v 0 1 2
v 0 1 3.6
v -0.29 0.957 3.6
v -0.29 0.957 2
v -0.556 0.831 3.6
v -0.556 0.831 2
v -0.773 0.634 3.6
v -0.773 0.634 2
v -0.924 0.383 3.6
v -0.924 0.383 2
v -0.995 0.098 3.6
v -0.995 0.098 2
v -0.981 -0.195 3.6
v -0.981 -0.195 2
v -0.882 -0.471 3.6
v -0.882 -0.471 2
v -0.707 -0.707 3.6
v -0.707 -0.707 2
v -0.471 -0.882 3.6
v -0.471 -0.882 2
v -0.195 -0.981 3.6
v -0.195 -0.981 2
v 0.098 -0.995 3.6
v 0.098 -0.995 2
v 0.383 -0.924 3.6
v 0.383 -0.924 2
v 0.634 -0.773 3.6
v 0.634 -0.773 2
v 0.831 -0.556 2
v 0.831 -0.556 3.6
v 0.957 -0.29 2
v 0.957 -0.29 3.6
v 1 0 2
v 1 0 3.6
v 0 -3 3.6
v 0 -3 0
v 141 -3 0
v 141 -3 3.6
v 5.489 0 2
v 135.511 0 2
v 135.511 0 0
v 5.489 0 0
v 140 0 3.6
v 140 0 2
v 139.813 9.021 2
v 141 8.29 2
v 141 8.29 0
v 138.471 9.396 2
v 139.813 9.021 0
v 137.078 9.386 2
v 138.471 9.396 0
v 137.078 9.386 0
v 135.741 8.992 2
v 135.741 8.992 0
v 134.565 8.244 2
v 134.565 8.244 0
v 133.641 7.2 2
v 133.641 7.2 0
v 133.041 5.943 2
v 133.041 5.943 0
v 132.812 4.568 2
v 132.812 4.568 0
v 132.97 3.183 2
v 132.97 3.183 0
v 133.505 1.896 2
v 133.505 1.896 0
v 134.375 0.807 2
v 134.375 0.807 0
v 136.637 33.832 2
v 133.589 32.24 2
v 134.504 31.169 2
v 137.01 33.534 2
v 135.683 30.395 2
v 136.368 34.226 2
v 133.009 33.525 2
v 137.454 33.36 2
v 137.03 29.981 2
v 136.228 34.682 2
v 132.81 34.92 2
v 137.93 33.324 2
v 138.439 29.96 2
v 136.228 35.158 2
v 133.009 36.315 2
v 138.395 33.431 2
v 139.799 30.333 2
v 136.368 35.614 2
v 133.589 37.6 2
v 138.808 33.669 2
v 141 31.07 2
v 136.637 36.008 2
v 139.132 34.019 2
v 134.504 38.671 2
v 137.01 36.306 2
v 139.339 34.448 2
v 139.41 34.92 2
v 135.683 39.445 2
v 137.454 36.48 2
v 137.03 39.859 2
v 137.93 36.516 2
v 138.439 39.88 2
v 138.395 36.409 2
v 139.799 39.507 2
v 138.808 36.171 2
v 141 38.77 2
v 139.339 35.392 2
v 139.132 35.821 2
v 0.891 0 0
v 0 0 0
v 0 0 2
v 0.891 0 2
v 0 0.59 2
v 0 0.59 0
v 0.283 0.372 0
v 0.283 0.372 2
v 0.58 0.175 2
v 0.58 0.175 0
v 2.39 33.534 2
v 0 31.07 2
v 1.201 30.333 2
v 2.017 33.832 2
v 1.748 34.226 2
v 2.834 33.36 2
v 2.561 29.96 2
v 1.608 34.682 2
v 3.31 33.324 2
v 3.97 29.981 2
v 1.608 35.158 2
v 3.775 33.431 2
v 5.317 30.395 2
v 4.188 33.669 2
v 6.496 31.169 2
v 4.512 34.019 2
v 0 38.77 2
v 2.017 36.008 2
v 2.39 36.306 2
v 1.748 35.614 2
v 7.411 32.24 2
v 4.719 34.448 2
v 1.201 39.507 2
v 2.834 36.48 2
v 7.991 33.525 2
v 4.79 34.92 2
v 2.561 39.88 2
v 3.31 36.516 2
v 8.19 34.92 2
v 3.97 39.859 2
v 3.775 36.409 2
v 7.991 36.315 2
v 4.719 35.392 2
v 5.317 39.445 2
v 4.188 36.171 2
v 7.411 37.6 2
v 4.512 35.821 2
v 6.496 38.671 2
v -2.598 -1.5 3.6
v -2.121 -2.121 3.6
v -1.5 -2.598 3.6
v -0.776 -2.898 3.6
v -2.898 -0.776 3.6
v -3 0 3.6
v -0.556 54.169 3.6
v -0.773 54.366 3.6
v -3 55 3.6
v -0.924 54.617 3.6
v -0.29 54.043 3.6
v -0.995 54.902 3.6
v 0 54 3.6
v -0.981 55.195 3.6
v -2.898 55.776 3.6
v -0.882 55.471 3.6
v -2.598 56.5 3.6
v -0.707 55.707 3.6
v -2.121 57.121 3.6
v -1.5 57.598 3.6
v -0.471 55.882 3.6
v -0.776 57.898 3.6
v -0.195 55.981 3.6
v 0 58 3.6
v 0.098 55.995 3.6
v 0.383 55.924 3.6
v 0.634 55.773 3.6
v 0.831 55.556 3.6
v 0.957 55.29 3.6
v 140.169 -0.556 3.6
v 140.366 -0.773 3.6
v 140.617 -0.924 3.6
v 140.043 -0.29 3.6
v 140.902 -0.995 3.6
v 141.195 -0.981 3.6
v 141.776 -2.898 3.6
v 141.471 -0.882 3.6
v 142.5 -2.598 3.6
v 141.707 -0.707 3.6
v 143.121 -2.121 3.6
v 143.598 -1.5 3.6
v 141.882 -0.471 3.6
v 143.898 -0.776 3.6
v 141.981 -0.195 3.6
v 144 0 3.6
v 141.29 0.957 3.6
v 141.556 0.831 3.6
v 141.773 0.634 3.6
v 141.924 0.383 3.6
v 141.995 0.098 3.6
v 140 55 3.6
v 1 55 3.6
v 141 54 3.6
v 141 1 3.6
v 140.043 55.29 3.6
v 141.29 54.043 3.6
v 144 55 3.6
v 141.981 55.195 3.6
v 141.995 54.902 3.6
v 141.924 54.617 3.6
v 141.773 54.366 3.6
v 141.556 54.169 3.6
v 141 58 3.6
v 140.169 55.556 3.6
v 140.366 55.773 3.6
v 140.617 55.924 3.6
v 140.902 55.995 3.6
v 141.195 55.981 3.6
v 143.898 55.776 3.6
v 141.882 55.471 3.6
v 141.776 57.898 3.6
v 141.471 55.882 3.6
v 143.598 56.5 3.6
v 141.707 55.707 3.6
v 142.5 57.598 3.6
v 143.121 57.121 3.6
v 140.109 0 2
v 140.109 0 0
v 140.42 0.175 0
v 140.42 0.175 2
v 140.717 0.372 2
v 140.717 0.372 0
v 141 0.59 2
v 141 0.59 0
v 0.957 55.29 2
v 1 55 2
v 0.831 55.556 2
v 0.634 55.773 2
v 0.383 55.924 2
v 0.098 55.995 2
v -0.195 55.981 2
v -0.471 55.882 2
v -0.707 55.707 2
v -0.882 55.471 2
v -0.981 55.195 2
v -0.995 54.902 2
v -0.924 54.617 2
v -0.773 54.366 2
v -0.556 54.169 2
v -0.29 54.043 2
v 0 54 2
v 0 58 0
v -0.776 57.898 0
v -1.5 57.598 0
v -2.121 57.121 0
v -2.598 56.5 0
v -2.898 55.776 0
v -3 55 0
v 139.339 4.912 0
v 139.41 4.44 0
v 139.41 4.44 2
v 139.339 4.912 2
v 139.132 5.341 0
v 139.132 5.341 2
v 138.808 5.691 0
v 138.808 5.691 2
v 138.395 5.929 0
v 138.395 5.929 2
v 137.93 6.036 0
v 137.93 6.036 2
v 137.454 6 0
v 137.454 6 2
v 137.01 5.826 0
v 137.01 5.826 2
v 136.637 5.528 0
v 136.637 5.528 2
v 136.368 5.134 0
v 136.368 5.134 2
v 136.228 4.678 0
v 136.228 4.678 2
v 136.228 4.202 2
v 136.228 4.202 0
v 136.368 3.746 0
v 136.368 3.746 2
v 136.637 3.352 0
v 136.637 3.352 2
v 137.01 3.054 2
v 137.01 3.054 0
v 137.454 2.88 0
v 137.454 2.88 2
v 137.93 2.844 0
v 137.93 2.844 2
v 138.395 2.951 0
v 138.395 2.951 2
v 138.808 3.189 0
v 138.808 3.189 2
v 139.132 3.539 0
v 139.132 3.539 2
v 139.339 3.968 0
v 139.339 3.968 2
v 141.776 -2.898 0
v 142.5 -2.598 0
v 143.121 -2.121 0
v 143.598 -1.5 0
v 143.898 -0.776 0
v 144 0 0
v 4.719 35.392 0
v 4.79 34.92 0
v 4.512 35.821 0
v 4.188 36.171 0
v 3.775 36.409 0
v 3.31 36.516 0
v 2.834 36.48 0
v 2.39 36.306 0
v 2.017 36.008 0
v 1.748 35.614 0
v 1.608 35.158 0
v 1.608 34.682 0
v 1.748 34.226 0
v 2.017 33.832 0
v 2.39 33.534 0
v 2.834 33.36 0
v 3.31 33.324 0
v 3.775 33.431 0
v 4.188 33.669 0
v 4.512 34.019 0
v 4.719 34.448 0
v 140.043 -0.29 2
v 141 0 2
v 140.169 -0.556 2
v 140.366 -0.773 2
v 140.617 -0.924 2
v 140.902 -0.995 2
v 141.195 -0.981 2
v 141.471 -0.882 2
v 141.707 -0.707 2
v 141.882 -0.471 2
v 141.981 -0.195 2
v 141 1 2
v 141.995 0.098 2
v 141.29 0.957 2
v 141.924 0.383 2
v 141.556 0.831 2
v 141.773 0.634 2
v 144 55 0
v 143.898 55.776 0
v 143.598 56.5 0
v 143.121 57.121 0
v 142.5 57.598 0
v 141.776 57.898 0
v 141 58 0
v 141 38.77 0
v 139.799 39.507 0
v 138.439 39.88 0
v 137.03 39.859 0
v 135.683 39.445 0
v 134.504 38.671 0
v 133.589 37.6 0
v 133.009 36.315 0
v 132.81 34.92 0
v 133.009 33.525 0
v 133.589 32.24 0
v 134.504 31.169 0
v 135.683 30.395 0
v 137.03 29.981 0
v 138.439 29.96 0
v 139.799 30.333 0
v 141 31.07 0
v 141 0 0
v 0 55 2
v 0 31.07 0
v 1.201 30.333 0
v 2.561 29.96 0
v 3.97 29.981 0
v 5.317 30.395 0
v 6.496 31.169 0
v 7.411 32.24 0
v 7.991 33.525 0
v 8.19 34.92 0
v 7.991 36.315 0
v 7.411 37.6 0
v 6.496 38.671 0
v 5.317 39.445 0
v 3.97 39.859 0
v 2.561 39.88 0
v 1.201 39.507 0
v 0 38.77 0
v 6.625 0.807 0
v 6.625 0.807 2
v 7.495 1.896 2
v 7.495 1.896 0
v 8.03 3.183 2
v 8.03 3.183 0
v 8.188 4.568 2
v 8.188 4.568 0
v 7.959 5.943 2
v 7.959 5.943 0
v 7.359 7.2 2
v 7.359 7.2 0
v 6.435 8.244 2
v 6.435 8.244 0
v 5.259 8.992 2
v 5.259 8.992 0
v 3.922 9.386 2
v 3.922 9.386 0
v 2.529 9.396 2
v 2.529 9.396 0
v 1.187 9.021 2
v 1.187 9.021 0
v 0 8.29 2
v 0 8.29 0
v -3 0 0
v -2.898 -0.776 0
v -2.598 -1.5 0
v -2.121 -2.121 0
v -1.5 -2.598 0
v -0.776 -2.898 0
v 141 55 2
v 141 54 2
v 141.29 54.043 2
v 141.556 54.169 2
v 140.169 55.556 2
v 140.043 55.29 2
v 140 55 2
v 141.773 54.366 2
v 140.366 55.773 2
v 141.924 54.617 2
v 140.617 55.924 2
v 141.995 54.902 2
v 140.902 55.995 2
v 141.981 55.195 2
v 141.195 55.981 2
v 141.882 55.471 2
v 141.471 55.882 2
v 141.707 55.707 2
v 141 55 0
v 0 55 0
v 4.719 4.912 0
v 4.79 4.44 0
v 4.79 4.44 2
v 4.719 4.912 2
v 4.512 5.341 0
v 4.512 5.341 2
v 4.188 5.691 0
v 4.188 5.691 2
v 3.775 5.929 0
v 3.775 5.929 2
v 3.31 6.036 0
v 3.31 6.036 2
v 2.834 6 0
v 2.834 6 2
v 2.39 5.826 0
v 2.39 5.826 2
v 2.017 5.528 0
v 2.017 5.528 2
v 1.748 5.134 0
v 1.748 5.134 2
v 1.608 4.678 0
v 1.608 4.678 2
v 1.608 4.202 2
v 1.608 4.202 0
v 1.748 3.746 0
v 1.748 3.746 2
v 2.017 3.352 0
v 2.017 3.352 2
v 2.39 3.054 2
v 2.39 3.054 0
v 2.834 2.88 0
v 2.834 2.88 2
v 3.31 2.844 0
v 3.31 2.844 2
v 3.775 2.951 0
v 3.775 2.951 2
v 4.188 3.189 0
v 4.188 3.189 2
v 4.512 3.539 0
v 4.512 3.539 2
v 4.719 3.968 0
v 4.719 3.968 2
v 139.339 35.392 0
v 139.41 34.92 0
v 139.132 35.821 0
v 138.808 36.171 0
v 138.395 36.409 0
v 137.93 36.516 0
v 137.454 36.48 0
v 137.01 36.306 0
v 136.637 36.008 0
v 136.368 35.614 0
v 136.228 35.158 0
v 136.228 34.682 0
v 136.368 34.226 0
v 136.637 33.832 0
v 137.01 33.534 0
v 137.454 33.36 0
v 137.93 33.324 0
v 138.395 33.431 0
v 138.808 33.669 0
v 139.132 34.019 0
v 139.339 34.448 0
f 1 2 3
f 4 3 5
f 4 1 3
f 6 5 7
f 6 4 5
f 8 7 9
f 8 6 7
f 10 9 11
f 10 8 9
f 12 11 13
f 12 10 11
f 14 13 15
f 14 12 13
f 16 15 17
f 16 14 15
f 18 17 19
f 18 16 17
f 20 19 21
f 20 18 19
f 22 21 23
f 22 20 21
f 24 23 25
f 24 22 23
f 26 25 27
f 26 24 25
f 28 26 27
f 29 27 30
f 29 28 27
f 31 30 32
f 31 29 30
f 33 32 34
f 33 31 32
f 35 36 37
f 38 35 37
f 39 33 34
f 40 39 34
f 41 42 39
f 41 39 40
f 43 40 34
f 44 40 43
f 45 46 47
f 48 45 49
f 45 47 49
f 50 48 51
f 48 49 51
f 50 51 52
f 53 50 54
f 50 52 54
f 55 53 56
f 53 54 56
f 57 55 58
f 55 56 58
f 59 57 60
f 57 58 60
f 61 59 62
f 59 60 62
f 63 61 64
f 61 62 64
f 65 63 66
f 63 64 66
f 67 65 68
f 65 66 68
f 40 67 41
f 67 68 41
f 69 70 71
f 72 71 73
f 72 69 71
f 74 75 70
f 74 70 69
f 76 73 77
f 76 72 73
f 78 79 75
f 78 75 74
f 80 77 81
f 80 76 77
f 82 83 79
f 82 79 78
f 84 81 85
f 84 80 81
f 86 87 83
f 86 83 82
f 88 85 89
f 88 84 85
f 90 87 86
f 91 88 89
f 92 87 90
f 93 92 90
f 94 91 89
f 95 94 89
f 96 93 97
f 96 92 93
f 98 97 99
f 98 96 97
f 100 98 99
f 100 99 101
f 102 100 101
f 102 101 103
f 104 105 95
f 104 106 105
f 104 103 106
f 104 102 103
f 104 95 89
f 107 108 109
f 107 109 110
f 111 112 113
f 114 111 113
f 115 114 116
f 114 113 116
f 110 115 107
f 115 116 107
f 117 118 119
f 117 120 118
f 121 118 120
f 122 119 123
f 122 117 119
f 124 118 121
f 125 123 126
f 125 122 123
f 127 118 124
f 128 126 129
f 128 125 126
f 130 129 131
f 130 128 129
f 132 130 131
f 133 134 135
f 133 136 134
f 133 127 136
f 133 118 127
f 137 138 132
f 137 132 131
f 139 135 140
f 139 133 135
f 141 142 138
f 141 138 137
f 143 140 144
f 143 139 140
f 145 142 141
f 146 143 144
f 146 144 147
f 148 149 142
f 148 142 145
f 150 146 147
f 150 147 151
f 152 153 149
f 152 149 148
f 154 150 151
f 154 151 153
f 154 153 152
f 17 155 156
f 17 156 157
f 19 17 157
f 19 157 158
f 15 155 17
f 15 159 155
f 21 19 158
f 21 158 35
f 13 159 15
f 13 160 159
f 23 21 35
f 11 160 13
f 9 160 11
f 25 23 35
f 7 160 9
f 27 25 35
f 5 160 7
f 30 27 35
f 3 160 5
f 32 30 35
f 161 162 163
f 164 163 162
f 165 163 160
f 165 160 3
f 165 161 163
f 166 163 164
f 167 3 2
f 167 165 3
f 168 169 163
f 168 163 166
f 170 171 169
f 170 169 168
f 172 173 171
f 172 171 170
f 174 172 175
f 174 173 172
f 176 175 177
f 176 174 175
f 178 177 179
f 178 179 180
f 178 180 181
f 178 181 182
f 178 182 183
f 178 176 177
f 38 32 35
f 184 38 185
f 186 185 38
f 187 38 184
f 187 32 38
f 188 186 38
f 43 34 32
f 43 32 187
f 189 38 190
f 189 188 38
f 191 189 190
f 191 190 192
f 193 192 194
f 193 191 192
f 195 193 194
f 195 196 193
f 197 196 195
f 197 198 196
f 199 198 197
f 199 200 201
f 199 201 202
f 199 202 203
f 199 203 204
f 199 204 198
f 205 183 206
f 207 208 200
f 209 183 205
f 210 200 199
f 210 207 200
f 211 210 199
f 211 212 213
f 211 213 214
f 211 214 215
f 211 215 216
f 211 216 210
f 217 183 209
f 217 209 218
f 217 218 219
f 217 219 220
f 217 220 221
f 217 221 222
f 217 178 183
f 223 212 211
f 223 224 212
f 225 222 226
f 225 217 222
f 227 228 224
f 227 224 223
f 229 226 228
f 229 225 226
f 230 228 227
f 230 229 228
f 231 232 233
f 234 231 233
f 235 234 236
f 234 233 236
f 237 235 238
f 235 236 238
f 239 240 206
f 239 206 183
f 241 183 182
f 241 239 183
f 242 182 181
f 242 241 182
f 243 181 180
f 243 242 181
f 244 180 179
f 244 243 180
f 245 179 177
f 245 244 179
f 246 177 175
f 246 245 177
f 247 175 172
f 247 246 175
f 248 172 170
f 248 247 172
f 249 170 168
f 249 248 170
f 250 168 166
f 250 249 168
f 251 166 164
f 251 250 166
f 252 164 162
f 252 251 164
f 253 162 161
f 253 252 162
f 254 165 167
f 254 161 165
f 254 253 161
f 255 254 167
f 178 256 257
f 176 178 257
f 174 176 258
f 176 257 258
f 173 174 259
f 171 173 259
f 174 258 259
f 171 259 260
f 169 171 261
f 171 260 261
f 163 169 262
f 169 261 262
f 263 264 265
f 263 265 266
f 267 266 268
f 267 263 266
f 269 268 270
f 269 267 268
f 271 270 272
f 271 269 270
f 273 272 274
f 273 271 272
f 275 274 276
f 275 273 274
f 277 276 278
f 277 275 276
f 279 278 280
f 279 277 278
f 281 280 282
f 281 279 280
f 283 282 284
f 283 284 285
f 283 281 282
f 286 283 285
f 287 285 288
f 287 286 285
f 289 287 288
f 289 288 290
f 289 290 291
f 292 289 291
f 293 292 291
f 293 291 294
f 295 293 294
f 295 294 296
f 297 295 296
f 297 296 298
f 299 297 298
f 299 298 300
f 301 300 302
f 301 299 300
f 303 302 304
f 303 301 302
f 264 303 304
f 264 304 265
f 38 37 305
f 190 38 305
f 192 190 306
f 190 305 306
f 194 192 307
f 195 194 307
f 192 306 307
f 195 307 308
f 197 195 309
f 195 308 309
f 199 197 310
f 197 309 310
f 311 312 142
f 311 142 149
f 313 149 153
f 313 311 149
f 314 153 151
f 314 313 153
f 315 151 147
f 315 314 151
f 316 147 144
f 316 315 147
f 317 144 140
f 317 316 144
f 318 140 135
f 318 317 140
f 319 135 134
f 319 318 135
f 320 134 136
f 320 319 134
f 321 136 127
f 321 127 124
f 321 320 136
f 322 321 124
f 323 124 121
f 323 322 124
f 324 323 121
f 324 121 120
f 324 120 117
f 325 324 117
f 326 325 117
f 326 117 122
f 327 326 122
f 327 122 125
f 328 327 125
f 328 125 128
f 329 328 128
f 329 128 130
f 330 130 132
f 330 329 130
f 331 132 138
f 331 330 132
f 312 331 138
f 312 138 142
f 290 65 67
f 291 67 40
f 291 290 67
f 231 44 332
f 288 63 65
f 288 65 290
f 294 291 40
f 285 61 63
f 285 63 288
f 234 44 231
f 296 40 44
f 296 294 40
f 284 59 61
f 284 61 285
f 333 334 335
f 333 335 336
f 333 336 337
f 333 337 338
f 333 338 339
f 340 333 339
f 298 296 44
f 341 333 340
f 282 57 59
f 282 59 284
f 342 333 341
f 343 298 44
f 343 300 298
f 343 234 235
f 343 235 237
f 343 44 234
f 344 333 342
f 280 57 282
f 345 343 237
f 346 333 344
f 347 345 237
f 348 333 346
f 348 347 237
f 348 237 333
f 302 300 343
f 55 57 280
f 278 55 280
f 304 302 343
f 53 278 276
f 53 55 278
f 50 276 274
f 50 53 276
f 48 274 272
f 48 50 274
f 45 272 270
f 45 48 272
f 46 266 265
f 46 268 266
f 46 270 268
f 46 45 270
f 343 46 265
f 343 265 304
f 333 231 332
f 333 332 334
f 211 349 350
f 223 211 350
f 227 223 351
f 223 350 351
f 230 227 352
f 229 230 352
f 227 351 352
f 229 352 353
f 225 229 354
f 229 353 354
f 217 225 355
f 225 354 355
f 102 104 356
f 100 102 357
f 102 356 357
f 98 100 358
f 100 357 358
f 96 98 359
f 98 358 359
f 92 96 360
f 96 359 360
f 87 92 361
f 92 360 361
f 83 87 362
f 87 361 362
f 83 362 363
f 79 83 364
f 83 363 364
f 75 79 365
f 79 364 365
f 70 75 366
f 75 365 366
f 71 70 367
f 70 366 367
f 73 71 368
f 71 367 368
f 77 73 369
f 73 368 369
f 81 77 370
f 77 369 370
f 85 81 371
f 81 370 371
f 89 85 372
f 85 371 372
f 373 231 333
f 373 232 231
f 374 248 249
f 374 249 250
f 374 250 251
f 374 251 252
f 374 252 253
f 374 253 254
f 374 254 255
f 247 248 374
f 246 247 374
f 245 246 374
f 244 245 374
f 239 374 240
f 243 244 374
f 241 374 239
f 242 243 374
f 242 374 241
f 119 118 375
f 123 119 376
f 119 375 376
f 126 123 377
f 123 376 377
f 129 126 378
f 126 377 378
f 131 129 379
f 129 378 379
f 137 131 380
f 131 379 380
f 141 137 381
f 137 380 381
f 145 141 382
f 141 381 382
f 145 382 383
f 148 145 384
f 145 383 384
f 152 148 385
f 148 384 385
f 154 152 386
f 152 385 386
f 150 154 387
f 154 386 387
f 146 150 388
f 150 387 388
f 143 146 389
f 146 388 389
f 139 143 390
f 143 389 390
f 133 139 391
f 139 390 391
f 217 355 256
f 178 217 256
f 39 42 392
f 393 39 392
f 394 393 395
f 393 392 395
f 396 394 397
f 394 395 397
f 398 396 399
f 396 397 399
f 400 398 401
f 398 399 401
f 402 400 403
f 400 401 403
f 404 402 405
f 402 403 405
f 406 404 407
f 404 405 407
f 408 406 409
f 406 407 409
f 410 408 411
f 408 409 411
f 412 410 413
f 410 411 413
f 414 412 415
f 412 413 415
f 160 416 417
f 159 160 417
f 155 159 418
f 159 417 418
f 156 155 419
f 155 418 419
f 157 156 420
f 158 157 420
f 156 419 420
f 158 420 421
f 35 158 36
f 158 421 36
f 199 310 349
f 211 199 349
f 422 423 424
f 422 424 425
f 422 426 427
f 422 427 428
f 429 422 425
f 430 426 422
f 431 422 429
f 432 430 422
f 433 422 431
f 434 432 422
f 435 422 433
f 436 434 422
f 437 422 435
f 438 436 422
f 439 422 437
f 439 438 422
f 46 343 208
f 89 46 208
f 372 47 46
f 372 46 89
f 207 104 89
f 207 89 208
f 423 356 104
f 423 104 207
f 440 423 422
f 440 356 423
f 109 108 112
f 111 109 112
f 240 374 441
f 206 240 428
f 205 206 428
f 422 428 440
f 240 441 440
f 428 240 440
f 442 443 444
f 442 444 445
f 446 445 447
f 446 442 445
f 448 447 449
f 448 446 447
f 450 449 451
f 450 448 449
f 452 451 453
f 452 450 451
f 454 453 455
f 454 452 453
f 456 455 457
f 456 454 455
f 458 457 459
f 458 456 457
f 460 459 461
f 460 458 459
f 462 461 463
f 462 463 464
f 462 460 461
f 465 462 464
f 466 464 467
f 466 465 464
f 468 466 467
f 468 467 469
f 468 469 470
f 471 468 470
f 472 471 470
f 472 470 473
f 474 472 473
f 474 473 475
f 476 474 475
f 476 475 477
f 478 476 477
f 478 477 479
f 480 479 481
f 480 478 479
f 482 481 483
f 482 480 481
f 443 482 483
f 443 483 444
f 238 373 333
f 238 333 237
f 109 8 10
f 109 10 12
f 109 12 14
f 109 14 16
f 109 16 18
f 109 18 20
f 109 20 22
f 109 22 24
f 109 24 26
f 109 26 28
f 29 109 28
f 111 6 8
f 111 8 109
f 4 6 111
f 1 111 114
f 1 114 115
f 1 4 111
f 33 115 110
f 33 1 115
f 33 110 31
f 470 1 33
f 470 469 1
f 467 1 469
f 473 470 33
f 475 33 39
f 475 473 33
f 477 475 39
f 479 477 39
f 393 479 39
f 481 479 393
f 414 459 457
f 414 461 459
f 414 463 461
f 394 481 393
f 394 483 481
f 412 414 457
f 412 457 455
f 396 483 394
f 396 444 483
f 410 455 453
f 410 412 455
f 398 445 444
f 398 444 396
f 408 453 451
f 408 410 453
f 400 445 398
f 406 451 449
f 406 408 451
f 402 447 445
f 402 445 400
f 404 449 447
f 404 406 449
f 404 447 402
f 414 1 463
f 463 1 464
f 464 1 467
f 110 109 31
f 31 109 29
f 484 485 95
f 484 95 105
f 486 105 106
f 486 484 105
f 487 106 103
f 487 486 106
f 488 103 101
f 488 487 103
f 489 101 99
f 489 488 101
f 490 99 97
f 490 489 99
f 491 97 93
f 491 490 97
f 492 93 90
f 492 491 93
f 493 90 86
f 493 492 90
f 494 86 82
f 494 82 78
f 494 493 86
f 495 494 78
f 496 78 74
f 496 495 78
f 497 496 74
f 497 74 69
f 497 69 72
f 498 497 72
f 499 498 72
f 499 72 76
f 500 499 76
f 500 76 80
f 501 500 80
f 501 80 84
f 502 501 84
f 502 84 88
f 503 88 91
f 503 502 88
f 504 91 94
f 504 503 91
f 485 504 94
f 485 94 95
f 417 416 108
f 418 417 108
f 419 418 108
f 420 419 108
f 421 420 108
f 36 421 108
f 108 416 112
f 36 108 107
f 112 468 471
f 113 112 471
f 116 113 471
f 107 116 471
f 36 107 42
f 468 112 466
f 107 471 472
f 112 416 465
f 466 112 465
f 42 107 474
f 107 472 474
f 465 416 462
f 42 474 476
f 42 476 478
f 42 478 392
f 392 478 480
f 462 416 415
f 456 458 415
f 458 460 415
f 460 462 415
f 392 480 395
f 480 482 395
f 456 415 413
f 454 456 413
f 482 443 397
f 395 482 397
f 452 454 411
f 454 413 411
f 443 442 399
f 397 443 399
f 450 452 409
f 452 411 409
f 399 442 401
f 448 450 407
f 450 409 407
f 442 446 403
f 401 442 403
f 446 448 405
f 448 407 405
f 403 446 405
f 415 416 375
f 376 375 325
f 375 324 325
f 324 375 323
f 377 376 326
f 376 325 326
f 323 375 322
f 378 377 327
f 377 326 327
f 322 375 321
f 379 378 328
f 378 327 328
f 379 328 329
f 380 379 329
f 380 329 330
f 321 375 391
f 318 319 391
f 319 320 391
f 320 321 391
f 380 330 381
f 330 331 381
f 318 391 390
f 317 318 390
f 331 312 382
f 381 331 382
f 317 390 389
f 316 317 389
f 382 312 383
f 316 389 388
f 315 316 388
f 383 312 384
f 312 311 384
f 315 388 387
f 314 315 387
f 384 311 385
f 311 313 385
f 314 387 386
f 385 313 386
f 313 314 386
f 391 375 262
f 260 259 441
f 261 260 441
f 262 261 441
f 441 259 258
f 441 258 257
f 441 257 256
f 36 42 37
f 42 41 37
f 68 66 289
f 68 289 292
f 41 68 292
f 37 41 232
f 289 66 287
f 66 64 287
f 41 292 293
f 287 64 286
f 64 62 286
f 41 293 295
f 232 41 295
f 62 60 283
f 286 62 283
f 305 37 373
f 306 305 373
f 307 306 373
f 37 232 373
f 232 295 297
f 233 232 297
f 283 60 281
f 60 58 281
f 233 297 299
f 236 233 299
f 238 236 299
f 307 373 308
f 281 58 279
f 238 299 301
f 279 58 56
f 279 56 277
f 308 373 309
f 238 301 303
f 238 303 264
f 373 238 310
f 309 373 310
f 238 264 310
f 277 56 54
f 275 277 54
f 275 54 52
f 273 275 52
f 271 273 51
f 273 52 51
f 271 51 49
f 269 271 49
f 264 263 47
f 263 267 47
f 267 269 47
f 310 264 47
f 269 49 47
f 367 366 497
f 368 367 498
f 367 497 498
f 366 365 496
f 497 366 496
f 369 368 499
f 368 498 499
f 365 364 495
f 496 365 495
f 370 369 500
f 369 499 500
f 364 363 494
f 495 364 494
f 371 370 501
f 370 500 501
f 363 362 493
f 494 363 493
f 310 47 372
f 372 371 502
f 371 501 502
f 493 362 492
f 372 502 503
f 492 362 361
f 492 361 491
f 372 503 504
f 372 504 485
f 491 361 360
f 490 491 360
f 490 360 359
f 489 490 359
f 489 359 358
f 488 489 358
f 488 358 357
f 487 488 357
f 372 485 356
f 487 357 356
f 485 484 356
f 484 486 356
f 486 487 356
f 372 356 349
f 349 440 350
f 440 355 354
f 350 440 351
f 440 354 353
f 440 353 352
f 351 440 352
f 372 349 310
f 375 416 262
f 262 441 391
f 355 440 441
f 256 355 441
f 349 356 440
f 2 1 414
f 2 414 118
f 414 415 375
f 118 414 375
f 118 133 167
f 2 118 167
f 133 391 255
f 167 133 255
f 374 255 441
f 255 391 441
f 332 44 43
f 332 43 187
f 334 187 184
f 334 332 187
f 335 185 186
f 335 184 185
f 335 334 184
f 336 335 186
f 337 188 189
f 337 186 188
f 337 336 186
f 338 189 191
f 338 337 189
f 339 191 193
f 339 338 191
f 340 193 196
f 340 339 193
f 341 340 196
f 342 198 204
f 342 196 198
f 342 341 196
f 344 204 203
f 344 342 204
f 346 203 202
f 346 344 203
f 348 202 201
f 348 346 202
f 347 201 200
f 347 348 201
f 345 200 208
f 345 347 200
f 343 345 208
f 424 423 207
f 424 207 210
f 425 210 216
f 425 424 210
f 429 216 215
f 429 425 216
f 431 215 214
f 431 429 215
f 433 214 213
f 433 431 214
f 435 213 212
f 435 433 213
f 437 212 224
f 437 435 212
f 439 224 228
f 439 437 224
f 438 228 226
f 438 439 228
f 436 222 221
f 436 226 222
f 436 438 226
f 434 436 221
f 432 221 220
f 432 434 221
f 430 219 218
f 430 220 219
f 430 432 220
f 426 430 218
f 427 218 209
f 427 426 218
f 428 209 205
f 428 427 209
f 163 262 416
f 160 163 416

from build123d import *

# Parameters (mm, degrees)
SKETCH001_W   = 141
SKETCH001_H   = 55
PAD_DEPTH     = 3.6
SKETCH002_R   = 5
SKETCH002_R_2 = 1.6
PAD001_DEPTH  = 2
SKETCH003_R   = 1
POCKET_DEPTH  = 1.601


with BuildPart() as part:
    # Sketch001 → Pad (new body)
    with BuildSketch(Plane.XY):
        with BuildLine():
            Line((0, -3), (141, -3))
            ThreePointArc((141, -3), (143.12132, -2.12132), (144, 0))
            Line((144, 0), (144, 55))
            ThreePointArc((144, 55), (143.12132, 57.12132), (141, 58))
            Line((141, 58), (0, 58))
            ThreePointArc((0, 58), (-2.12132, 57.12132), (-3, 55))
            Line((-3, 55), (-3, 0))
            ThreePointArc((-3, 0), (-2.12132, -2.12132), (0, -3))
        make_face()
        with Locations((70.5, 27.5)):
            Rectangle(SKETCH001_W, SKETCH001_H, mode=Mode.SUBTRACT)
    extrude(amount=PAD_DEPTH)

    # Sketch002 → Pad001 (join)
    with BuildSketch(Plane.XY):
        with Locations((3.19, 34.92)):
            Circle(SKETCH002_R)
        with Locations((3.19, 34.92)):
            Circle(SKETCH002_R_2, mode=Mode.SUBTRACT)
        with Locations((3.19, 4.44)):
            Circle(SKETCH002_R)
        with Locations((3.19, 4.44)):
            Circle(SKETCH002_R_2, mode=Mode.SUBTRACT)
        with Locations((137.81, 4.44)):
            Circle(SKETCH002_R)
        with Locations((137.81, 4.44)):
            Circle(SKETCH002_R_2, mode=Mode.SUBTRACT)
        with Locations((137.81, 34.92)):
            Circle(SKETCH002_R)
        with Locations((137.81, 34.92)):
            Circle(SKETCH002_R_2, mode=Mode.SUBTRACT)
    extrude(amount=PAD001_DEPTH)

    # Sketch003 → Pocket (cut, through all)
    with BuildSketch(Plane.XY.offset(2)):
        with Locations((0, 55)):
            Circle(SKETCH003_R)
        with Locations((141, 55)):
            Circle(SKETCH003_R)
        Circle(SKETCH003_R)
        with Locations((141, 0)):
            Circle(SKETCH003_R)
    extrude(amount=POCKET_DEPTH, mode=Mode.SUBTRACT)


solid = part.part
